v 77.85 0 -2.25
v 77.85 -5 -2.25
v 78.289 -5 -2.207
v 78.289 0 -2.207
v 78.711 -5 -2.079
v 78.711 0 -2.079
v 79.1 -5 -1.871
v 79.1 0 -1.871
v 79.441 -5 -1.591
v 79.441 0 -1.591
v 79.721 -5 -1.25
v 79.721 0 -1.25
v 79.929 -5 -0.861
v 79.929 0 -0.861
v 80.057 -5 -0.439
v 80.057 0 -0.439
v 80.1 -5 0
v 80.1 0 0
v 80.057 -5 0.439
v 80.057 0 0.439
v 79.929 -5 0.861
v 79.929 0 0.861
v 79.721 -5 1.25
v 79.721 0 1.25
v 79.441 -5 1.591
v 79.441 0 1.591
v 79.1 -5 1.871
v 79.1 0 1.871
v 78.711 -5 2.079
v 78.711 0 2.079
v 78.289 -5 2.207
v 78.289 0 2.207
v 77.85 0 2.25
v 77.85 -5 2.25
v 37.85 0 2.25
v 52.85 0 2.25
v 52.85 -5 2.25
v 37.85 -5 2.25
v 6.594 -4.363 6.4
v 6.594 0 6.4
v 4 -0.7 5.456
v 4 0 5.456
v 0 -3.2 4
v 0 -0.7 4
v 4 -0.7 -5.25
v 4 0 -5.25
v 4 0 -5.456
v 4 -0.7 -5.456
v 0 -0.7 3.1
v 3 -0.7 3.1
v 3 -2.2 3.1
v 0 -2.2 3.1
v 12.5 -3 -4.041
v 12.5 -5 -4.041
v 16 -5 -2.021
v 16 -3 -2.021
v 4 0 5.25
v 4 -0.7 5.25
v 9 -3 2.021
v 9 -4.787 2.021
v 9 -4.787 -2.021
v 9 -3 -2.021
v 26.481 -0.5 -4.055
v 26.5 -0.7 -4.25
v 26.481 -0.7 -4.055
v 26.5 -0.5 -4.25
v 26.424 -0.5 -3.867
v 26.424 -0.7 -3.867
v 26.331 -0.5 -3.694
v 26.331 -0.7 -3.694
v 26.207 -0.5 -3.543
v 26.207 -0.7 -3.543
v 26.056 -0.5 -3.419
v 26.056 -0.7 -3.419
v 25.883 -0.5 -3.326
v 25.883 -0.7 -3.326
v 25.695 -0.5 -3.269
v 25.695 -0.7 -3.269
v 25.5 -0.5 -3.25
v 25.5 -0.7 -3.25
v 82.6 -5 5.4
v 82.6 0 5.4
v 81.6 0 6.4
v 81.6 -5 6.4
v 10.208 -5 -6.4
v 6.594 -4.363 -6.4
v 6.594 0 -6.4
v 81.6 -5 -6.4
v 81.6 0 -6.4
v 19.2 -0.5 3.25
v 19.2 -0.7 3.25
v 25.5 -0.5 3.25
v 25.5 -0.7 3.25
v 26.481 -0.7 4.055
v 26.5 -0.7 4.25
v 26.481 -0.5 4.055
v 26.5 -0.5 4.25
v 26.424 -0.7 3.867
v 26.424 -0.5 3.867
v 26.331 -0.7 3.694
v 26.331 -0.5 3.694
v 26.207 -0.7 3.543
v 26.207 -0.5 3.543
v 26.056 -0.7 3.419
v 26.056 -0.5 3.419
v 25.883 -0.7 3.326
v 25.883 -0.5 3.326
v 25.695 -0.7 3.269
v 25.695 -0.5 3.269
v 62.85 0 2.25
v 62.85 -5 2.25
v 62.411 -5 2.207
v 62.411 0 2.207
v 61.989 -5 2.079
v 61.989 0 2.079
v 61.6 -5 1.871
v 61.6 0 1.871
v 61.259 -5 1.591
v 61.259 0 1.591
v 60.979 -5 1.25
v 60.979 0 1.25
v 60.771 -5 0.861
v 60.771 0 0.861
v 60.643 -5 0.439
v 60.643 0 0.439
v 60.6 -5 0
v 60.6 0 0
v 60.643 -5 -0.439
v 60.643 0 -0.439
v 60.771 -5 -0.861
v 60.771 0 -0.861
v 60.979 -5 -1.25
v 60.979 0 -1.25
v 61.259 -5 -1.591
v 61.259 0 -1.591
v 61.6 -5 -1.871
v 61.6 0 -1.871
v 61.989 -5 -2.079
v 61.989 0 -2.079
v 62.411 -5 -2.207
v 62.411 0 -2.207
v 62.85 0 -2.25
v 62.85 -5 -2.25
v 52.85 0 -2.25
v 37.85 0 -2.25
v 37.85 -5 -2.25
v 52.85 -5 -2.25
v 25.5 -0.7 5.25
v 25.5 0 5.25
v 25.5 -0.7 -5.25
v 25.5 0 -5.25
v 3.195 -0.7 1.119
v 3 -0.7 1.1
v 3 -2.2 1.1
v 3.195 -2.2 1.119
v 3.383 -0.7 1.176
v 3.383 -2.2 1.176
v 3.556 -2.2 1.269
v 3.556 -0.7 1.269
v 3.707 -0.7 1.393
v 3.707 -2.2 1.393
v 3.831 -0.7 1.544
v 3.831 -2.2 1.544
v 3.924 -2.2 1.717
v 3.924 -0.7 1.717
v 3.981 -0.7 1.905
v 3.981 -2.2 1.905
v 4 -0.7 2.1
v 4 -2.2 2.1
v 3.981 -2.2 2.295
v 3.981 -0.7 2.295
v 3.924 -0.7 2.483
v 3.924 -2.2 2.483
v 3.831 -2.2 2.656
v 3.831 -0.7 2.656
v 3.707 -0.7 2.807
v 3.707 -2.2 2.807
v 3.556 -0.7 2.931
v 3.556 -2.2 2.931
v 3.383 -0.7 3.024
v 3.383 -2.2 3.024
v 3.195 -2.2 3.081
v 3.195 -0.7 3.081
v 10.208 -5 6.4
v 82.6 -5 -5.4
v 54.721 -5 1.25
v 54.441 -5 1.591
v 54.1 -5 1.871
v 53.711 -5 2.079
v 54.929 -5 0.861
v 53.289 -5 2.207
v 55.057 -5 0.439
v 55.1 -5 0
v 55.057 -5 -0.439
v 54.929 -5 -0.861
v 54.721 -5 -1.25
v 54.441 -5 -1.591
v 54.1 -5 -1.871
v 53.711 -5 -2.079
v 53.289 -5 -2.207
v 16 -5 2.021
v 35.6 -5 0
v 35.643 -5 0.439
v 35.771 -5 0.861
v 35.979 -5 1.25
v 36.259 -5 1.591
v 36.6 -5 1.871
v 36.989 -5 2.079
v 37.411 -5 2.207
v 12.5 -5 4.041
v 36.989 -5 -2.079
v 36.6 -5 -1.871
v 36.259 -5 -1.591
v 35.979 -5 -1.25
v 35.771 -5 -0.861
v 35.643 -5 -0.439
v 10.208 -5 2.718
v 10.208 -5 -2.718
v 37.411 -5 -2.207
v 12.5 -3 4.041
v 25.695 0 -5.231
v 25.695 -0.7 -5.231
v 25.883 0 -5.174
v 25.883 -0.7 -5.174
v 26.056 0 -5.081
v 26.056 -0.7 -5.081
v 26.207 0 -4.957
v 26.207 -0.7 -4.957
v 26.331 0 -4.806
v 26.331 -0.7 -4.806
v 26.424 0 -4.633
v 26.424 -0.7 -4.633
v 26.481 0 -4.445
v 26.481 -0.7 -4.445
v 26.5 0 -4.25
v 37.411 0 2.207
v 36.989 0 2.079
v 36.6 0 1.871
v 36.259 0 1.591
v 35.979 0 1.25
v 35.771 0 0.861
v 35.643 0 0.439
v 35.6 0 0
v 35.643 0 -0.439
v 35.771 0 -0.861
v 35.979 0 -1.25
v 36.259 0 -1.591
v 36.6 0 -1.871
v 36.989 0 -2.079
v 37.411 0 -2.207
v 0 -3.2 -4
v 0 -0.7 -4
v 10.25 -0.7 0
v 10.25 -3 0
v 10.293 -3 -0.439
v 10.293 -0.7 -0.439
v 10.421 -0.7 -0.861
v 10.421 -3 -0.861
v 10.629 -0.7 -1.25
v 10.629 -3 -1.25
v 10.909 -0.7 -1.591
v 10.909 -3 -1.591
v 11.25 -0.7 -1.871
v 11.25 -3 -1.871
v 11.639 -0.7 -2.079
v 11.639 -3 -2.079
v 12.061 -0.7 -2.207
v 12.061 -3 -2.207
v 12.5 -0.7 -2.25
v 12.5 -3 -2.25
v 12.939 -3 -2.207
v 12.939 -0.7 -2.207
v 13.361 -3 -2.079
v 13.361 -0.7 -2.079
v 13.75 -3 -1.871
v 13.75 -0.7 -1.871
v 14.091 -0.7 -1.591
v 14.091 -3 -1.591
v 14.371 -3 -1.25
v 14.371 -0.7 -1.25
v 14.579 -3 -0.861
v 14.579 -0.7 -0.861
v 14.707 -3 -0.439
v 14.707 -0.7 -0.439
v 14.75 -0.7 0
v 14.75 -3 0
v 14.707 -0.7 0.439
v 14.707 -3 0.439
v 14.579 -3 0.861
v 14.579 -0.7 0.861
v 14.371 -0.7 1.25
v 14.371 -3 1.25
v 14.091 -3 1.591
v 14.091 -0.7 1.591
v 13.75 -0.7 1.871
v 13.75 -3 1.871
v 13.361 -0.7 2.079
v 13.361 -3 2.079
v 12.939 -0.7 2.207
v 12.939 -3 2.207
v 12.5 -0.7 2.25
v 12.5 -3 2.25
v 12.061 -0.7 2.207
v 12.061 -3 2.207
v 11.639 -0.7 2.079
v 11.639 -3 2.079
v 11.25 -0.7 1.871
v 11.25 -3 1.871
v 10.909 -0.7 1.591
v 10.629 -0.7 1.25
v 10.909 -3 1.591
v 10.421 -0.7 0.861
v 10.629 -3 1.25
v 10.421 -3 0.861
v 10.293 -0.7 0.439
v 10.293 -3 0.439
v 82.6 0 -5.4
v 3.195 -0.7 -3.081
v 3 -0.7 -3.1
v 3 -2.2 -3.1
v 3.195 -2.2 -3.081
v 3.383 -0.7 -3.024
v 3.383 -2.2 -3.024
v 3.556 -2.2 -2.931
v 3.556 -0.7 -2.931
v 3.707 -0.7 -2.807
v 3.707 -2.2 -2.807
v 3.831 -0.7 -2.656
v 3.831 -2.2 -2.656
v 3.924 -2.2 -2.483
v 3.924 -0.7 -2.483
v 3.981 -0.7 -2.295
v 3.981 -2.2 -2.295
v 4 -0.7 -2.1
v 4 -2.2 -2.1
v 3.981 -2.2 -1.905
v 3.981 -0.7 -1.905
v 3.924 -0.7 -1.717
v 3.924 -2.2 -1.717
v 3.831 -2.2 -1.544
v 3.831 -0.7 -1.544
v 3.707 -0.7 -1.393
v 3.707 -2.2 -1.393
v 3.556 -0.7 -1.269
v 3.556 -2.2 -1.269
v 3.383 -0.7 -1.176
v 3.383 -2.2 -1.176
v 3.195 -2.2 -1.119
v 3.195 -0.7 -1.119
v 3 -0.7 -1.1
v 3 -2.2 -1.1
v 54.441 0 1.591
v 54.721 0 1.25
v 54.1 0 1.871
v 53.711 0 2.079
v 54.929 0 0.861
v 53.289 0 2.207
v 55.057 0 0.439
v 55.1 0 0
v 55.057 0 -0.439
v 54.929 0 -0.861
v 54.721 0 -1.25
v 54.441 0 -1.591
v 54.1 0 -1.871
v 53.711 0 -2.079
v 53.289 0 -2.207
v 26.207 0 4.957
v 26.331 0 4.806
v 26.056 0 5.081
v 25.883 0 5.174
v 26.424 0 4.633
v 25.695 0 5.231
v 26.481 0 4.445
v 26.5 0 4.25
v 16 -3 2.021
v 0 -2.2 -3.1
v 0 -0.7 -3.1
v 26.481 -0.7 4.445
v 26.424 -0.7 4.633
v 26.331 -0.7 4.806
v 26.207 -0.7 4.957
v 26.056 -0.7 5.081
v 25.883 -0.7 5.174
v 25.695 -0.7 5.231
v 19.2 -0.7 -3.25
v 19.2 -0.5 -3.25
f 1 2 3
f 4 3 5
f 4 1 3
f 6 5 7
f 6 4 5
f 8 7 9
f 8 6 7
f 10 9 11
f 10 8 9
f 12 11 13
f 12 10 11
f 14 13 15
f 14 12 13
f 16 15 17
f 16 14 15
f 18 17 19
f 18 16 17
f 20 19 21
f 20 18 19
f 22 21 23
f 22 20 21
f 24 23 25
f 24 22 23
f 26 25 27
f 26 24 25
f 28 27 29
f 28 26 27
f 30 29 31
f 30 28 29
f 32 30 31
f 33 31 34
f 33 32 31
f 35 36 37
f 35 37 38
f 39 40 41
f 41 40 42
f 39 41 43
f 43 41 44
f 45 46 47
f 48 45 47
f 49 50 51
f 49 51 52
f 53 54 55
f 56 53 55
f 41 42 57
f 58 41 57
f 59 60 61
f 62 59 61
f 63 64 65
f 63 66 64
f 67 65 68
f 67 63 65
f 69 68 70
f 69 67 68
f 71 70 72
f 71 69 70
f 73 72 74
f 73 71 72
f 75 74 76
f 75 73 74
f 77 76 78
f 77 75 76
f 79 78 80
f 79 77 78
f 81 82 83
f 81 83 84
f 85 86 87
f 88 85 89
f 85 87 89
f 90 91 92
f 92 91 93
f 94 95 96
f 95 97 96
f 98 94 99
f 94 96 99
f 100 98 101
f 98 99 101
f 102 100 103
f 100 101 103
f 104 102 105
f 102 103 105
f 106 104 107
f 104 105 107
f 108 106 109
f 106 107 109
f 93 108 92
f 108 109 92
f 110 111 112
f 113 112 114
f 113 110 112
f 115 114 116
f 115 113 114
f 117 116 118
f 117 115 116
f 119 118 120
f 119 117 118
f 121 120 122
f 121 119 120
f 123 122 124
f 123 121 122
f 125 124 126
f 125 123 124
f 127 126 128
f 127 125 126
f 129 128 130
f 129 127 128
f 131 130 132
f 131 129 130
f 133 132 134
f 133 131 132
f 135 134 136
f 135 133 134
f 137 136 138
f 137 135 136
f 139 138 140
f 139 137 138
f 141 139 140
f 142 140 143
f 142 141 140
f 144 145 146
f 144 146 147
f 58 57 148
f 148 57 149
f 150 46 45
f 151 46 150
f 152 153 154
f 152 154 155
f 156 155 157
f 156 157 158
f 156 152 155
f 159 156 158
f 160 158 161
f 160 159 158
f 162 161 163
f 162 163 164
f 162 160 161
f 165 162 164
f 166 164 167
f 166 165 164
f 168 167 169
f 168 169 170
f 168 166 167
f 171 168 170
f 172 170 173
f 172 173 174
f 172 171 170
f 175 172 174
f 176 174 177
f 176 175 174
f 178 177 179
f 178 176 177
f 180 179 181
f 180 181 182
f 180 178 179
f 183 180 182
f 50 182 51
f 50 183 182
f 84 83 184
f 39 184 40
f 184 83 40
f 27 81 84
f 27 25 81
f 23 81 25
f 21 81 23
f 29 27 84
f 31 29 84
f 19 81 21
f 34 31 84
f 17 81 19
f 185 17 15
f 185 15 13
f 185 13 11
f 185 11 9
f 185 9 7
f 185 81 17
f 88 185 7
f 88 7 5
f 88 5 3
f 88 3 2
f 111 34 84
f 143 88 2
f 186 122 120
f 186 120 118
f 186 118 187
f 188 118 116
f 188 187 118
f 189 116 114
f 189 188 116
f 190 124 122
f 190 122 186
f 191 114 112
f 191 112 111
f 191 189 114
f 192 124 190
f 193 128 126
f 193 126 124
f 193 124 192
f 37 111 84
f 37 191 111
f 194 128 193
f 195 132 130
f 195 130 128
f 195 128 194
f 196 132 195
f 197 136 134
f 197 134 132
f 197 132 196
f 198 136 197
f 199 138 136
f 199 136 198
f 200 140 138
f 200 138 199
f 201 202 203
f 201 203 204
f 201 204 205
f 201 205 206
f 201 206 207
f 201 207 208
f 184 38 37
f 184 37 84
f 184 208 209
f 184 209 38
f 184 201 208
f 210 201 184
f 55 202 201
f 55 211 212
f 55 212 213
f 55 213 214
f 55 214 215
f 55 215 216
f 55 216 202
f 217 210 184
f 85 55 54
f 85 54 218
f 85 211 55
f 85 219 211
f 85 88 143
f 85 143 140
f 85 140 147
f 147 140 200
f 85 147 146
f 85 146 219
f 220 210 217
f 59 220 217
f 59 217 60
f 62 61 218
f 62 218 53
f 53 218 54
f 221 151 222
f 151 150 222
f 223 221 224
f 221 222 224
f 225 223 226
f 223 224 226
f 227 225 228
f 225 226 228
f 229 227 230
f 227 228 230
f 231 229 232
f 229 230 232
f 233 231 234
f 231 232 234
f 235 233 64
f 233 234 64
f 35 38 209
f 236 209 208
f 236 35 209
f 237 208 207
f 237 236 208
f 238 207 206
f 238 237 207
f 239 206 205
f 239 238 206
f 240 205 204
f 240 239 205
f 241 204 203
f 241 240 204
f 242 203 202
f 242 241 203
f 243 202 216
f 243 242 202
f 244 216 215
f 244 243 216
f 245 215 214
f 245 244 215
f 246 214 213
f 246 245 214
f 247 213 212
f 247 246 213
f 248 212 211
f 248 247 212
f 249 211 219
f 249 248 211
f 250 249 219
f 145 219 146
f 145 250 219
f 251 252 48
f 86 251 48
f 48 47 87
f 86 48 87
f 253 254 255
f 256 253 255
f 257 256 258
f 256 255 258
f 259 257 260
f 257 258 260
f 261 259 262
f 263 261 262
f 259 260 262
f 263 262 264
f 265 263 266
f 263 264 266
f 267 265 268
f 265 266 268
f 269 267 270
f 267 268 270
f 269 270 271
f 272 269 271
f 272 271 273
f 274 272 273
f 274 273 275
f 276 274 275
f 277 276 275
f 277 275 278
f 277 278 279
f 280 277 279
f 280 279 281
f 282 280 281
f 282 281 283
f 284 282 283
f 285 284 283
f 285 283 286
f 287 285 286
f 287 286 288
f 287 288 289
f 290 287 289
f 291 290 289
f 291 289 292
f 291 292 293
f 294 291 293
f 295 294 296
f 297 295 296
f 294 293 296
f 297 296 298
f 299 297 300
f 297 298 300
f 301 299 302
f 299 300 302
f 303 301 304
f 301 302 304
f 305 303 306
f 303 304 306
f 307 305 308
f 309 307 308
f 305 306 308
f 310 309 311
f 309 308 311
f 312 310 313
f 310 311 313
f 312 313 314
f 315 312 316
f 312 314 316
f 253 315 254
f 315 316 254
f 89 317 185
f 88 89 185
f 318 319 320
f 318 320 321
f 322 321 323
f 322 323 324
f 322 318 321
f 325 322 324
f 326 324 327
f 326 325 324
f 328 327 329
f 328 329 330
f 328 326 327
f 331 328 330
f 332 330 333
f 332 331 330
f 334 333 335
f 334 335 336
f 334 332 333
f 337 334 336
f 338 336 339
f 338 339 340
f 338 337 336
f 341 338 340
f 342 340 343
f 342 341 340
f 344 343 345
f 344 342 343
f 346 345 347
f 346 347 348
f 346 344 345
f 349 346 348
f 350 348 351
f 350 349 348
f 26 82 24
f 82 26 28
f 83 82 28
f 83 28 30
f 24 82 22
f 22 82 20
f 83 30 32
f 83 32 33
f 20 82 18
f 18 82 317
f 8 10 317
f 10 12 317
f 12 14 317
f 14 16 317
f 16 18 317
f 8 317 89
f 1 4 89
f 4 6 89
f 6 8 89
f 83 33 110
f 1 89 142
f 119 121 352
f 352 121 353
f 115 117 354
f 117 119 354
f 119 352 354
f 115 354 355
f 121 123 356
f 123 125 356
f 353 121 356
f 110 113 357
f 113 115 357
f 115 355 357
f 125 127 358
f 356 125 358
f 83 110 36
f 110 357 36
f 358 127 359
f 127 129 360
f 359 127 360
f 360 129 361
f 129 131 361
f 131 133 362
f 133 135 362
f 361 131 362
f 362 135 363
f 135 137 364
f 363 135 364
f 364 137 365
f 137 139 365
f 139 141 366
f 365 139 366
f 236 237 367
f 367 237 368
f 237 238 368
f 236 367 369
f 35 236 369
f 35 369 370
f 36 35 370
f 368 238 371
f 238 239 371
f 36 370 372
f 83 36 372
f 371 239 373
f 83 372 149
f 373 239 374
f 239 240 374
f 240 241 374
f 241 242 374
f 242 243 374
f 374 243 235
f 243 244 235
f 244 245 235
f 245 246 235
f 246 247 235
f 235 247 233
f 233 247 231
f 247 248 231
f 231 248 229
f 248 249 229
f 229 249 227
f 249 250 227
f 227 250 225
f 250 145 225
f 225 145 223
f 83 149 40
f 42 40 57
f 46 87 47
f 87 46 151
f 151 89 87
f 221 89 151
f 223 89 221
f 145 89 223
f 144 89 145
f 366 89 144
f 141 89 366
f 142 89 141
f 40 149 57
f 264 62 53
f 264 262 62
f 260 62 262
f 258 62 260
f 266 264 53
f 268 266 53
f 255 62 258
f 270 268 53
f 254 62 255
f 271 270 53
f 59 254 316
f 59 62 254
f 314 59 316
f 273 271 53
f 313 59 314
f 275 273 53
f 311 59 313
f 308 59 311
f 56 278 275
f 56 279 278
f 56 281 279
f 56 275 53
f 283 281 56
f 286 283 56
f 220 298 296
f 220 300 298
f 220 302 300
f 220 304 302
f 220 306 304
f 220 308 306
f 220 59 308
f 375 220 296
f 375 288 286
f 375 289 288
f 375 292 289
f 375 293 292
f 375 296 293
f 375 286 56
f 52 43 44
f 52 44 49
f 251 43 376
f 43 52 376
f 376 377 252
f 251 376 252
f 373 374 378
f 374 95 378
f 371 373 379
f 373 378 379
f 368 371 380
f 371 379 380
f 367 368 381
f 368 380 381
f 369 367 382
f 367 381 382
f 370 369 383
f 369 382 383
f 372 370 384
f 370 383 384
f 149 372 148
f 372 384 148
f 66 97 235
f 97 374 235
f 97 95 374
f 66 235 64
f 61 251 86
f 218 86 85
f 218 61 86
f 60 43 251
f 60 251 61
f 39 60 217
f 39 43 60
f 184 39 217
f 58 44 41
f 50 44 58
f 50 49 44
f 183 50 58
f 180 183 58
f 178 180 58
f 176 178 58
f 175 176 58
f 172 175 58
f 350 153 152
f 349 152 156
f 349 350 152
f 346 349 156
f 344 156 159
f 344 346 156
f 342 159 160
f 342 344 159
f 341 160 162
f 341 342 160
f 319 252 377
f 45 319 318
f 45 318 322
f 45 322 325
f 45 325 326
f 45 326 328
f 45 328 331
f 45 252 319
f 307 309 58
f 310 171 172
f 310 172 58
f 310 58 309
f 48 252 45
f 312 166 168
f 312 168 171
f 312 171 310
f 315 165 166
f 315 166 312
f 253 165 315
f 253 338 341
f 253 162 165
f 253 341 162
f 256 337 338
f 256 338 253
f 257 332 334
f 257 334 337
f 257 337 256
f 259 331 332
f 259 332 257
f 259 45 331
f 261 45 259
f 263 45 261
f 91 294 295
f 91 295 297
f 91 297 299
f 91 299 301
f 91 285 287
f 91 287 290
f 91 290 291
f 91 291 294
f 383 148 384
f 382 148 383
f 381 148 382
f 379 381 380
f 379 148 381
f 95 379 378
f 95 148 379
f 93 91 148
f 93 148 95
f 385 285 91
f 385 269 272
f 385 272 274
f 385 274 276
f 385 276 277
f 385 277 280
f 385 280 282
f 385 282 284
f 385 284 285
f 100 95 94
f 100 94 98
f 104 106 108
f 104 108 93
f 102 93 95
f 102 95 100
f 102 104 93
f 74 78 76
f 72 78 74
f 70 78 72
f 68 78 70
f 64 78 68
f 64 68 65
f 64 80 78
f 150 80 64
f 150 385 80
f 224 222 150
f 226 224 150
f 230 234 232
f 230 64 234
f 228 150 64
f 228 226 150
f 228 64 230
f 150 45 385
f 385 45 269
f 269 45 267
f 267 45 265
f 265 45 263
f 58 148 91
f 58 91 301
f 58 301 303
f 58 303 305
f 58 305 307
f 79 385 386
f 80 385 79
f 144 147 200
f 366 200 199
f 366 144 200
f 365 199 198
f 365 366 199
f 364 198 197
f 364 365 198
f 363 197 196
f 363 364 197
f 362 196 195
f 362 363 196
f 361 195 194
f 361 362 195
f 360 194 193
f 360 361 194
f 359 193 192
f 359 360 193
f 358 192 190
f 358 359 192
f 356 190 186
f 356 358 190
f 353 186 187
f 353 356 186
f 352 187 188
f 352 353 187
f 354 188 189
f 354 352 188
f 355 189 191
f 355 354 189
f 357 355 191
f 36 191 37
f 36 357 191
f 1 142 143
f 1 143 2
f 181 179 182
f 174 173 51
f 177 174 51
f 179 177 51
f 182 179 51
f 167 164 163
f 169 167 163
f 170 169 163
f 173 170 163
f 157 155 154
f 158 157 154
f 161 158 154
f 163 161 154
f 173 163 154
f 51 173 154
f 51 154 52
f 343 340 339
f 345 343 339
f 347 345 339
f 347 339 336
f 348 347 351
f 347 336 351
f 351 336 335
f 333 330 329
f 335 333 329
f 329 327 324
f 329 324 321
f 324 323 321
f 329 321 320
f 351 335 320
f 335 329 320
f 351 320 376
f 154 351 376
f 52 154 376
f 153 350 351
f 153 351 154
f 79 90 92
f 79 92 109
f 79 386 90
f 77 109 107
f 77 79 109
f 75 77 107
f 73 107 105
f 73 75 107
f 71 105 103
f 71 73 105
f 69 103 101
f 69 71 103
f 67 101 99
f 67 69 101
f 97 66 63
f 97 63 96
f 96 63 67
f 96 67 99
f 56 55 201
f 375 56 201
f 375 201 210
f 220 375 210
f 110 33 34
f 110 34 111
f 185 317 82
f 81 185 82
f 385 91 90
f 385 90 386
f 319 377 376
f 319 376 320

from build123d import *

# Parameters (mm, degrees)
BOSS_EXTRUDE1_DEPTH   = 5
CUT_EXTRUDE1_REACH    = 84.998
CUT_EXTRUDE2_DEPTH    = 9
SKETCH7_W             = 26.5
SKETCH7_H             = 10.5
CUT_EXTRUDE3_DEPTH    = 0.7
CUT_EXTRUDE4_DEPTH    = 1.5
F_4_0MM_DOWEL_HOLE1_D = 4.5
CUT_EXTRUDE6_DEPTH    = 2
CHAMFER1_SIZE         = 1
SKETCH12_W            = 4
SKETCH12_H            = 16
CUT_EXTRUDE5_DEPTH    = 0.7
SKETCH13_W            = 7.3
SKETCH13_H            = 6.5
BOSS_EXTRUDE2_DEPTH   = 0.2
FILLET1_R             = 1


with BuildPart() as part:
    # Sketch1 → Boss-Extrude1 (new body)
    with BuildSketch(Plane(origin=(0, 0, 0), x_dir=(1, 0, 0), z_dir=(0, 1, 0))):
        Polygon((0, -4), (0, 4), (6.593945807, 6.4), (82.6, 6.4), (82.6, -6.4), (6.593945807, -6.4), align=None)
    extrude(amount=-BOSS_EXTRUDE1_DEPTH)

    # Sketch2 → Cut-Extrude1 (cut, up to next)
    with BuildSketch(Plane(origin=(0, 0, 0), x_dir=(1, 0, 0), z_dir=(0, 1, 0)), mode=Mode.PRIVATE) as cut_extrude1_sk1:
        with BuildLine():
            Line((62.85, 2.25), (77.85, 2.25))
            ThreePointArc((77.85, 2.25), (80.1, 0), (77.85, -2.25))
            Line((77.85, -2.25), (62.85, -2.25))
            ThreePointArc((62.85, -2.25), (60.6, 0), (62.85, 2.25))
        make_face()
    cut_extrude1_tool1 = extrude(cut_extrude1_sk1.sketch, amount=-CUT_EXTRUDE1_REACH, mode=Mode.PRIVATE) & part.part
    # Sketch2 → Cut-Extrude1 (cut, up to next)
    with BuildSketch(Plane(origin=(0, 0, 0), x_dir=(1, 0, 0), z_dir=(0, 1, 0)), mode=Mode.PRIVATE) as cut_extrude1_sk2:
        with BuildLine():
            Line((52.85, -2.25), (37.85, -2.25))
            ThreePointArc((37.85, -2.25), (35.6, 0), (37.85, 2.25))
            Line((37.85, 2.25), (52.85, 2.25))
            ThreePointArc((52.85, 2.25), (55.1, 0), (52.85, -2.25))
        make_face()
    cut_extrude1_tool2 = extrude(cut_extrude1_sk2.sketch, amount=-CUT_EXTRUDE1_REACH, mode=Mode.PRIVATE) & part.part
    add(cut_extrude1_tool1.solids().sort_by_distance((70.35, 0, 0))[0], mode=Mode.SUBTRACT)
    add(cut_extrude1_tool2.solids().sort_by_distance((45.35, 0, 0))[0], mode=Mode.SUBTRACT)

    # Sketch6 → Cut-Extrude2 (cut, symmetric)
    with BuildSketch(Plane.XY):
        Polygon((0, -3.2), (10.208307275, -5), (0, -5), align=None)
    extrude(amount=CUT_EXTRUDE2_DEPTH, both=True, mode=Mode.SUBTRACT)

    # Sketch7 → Cut-Extrude3 (cut)
    with BuildSketch(Plane(origin=(0, 0, 0), x_dir=(1, 0, 0), z_dir=(0, 1, 0))):
        with Locations((13.25, 0)):
            Rectangle(SKETCH7_W, SKETCH7_H)
    extrude(amount=-CUT_EXTRUDE3_DEPTH, mode=Mode.SUBTRACT)

    # Sketch8 → Cut-Extrude4 (cut)
    with BuildSketch(Plane(origin=(0, -0.7, 0), x_dir=(1, 0, 0), z_dir=(0, 1, 0))):
        with BuildLine():
            Line((0, -3.1), (0, 3.1))
            Line((0, 3.1), (3, 3.1))
            ThreePointArc((3, 3.1), (4, 2.1), (3, 1.1))
            Line((3, 1.1), (3, 0))
            Line((3, 0), (3, -1.1))
            ThreePointArc((3, -1.1), (4, -2.1), (3, -3.1))
            Line((3, -3.1), (0, -3.1))
        make_face()
    extrude(amount=-CUT_EXTRUDE4_DEPTH, mode=Mode.SUBTRACT)

    # Ø4.0mm Dowel Hole1 (through all)
    with Locations(Plane(origin=(0, -0.7, 0), x_dir=(1, 0, 0), z_dir=(0, 1, 0))):
        with Locations((12.5, 0)):
            Hole(F_4_0MM_DOWEL_HOLE1_D / 2)

    # Sketch14 → Cut-Extrude6 (cut)
    with BuildSketch(Plane.XZ.offset(5)):
        Polygon((16, -2.020725942), (16, 2.020725942), (12.5, 4.041451884), (9, 2.020725942), (9, -2.020725942), (12.5, -4.041451884), align=None)
    extrude(amount=-CUT_EXTRUDE6_DEPTH, mode=Mode.SUBTRACT)

    # Chamfer1
    chamfer1_edges = [part.edges().sort_by_distance(p)[0] for p in [
        (82.6, -2.5, -6.4),
        (82.6, -2.5, 6.4),
    ]]
    chamfer(chamfer1_edges, length=CHAMFER1_SIZE)

    # Sketch12 → Cut-Extrude5 (cut)
    with BuildSketch(Plane(origin=(0, 0, 0), x_dir=(1, 0, 0), z_dir=(0, 1, 0))):
        with Locations((2, 0)):
            Rectangle(SKETCH12_W, SKETCH12_H)
    extrude(amount=-CUT_EXTRUDE5_DEPTH, mode=Mode.SUBTRACT)

    # Sketch13 → Boss-Extrude2 (add)
    with BuildSketch(Plane(origin=(0, -0.7, 0), x_dir=(1, 0, 0), z_dir=(0, 1, 0))):
        with Locations((22.85, 0)):
            Rectangle(SKETCH13_W, SKETCH13_H)
    extrude(amount=BOSS_EXTRUDE2_DEPTH)

    # Fillet1
    fillet1_edges = [part.edges().sort_by_distance(p)[0] for p in [
        (26.5, -0.35, 5.25),
        (26.5, -0.6, 3.25),
        (26.5, -0.6, -3.25),
        (26.5, -0.35, -5.25),
    ]]
    fillet(fillet1_edges, radius=FILLET1_R - 0.0001)  # a hair under: the kernel refuses the full size


solid = part.part
